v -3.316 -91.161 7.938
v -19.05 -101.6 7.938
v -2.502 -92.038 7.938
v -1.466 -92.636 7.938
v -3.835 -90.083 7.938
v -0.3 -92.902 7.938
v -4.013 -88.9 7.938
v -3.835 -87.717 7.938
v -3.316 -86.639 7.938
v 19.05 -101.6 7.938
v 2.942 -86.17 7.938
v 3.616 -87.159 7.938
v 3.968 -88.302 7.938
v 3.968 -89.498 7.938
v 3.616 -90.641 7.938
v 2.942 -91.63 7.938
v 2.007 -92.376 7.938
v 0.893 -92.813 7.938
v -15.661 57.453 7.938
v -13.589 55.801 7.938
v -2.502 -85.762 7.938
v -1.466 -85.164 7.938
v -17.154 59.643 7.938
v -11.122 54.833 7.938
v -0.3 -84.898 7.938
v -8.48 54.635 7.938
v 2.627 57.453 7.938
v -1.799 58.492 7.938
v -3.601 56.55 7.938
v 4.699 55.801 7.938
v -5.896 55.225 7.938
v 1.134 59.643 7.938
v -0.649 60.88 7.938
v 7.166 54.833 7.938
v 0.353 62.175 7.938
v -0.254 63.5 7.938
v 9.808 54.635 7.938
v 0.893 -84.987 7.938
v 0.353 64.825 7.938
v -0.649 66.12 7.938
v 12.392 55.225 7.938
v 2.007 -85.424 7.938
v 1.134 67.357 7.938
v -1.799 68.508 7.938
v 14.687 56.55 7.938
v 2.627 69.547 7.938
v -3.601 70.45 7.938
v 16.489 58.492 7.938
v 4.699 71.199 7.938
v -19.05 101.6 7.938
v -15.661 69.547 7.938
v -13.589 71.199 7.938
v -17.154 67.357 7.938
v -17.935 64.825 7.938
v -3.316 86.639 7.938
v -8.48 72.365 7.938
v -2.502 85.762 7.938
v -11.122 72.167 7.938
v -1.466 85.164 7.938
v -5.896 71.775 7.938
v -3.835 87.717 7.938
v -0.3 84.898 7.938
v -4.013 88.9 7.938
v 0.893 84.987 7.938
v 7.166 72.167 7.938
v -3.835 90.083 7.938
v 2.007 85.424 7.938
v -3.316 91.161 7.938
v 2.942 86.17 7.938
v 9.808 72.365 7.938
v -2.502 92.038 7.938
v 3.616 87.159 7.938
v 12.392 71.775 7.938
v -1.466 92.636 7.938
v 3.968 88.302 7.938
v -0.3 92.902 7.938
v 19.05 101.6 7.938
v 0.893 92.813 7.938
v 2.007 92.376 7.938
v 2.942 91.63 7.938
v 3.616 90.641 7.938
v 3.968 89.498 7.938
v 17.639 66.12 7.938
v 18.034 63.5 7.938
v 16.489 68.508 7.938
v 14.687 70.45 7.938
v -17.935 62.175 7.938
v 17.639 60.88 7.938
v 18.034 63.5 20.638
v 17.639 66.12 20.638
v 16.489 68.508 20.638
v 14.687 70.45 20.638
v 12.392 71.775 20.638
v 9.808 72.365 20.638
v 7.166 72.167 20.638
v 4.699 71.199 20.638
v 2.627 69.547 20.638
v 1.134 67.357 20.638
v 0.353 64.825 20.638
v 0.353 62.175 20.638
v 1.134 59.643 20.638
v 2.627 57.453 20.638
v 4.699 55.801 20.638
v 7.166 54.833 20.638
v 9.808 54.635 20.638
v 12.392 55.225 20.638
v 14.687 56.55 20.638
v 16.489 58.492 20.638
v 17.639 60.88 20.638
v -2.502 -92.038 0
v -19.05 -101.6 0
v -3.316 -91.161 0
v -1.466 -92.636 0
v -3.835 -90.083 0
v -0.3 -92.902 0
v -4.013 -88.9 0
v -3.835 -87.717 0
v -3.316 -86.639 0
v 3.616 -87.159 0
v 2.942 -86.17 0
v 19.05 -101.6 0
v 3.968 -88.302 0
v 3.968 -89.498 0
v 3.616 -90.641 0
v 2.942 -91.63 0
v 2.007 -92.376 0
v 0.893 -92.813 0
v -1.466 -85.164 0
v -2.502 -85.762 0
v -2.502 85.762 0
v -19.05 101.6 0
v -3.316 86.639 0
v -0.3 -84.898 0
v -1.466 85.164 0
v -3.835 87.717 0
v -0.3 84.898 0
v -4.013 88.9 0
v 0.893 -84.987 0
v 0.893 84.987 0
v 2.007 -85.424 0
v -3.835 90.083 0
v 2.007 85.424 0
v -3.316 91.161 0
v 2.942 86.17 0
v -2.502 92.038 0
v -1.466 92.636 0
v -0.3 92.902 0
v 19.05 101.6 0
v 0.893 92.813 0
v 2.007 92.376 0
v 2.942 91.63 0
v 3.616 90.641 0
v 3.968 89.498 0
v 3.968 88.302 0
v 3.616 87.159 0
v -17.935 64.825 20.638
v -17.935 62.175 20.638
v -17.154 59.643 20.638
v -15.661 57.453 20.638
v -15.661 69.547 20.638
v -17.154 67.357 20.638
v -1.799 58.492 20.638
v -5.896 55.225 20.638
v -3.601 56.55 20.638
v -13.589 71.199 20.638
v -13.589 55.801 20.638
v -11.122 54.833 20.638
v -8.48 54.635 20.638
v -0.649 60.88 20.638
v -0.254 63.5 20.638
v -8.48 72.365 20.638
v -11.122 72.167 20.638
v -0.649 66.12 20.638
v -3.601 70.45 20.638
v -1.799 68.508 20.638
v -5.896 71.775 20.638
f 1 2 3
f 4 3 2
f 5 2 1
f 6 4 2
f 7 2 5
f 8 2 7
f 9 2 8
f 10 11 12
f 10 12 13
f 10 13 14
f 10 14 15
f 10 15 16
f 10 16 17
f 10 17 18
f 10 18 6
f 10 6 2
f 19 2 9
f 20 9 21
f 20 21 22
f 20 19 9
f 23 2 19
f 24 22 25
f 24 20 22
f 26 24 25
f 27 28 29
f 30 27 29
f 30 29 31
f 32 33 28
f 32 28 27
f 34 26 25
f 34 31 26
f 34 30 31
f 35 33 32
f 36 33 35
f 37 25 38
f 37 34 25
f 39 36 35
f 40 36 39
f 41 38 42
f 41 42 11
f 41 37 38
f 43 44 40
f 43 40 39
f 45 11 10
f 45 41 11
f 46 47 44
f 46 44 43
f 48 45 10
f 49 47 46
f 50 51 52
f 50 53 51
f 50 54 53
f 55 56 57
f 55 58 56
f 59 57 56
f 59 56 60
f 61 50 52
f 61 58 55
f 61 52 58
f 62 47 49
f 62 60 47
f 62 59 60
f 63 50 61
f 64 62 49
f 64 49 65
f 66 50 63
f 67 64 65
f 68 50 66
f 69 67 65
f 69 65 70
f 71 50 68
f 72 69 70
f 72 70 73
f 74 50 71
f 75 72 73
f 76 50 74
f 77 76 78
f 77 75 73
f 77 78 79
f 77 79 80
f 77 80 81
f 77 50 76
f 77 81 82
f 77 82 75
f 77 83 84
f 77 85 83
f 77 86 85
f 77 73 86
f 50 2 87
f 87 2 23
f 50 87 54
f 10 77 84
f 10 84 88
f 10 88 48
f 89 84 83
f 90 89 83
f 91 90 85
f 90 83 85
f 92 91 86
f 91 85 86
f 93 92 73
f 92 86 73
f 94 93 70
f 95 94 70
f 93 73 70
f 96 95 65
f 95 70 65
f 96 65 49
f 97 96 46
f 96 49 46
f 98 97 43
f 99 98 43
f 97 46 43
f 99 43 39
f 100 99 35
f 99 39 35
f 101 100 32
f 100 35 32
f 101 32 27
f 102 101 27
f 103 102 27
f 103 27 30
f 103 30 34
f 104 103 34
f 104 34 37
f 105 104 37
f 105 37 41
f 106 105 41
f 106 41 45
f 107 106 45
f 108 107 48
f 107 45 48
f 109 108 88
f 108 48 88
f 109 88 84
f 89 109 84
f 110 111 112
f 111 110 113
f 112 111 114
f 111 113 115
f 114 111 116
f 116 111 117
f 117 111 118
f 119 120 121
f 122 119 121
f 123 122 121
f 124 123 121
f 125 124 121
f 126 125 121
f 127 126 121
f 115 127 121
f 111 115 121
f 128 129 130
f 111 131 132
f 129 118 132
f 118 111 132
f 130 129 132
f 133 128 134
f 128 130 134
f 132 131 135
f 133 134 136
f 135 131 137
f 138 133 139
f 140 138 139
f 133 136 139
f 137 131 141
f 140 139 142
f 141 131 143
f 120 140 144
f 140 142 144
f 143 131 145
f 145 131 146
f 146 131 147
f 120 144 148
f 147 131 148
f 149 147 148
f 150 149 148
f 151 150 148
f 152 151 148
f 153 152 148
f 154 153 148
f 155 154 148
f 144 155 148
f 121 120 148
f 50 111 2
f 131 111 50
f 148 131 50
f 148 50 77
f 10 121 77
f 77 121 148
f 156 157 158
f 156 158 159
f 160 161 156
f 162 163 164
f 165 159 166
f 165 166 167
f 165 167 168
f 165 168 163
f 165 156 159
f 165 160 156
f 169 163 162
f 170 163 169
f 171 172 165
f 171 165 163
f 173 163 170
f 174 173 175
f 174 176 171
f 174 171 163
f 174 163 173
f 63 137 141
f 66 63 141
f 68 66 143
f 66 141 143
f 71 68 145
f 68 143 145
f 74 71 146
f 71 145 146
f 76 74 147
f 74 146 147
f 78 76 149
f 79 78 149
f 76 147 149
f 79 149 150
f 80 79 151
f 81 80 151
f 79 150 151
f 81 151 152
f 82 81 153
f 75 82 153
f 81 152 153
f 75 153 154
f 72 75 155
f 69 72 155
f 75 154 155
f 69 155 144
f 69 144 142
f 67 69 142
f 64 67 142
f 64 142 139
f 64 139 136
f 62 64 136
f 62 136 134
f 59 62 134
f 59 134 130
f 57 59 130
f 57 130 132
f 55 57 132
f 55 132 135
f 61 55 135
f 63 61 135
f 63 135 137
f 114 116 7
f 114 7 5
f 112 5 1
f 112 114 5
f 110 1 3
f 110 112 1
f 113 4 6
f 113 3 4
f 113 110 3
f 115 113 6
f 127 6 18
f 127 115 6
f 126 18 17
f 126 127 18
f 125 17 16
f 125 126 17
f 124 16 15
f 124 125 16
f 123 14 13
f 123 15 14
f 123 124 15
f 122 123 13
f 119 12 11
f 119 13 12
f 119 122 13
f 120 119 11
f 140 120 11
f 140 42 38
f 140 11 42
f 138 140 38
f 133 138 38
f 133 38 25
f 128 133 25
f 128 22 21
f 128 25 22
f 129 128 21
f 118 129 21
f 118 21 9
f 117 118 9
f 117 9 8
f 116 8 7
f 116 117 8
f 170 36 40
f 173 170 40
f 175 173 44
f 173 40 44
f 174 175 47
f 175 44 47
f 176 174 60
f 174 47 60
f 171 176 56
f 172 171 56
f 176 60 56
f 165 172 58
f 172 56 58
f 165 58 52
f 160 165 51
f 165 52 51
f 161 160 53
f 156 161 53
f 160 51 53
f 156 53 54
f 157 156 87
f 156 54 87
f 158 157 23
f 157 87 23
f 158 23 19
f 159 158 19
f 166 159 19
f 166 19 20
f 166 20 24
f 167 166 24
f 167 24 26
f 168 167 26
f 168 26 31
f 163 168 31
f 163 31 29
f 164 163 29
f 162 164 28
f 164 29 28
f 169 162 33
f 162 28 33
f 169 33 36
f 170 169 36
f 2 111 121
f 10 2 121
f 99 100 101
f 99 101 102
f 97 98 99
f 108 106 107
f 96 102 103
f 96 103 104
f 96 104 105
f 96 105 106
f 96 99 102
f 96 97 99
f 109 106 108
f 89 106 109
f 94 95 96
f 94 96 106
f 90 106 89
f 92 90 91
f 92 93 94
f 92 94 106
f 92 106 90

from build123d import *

# Parameters (mm, degrees)
SKETCH1_W                = 38.1
SKETCH1_H                = 203.2
BOSS_EXTRUDE1_DEPTH      = 7.9375
O_0_316_DIAMETER_HOLE1_D = 8.0264
SKETCH4_R                = 8.89
BOSS_EXTRUDE2_DEPTH      = 12.7


with BuildPart() as part:
    # Sketch1 → Boss-Extrude1 (new body)
    with BuildSketch(Plane.XY):
        Rectangle(SKETCH1_W, SKETCH1_H)
    extrude(amount=BOSS_EXTRUDE1_DEPTH)

    # O (0.316) Diameter Hole1 (through all)
    with Locations(Plane.XY.offset(7.9375)):
        with Locations((0, 88.9)):
            o_0_316_diameter_hole1 = Hole(O_0_316_DIAMETER_HOLE1_D / 2)

    # Mirror1: O (0.316) Diameter Hole1 across plane
    add(o_0_316_diameter_hole1.mirror(Plane.ZX), mode=Mode.SUBTRACT)

    # Sketch4 → Boss-Extrude2 (add)
    with BuildSketch(Plane.XY.offset(7.9375)):
        with Locations((-9.144, 63.5)):
            Circle(SKETCH4_R)
        with Locations((9.144, 63.5)):
            Circle(SKETCH4_R)
    extrude(amount=BOSS_EXTRUDE2_DEPTH)


solid = part.part
